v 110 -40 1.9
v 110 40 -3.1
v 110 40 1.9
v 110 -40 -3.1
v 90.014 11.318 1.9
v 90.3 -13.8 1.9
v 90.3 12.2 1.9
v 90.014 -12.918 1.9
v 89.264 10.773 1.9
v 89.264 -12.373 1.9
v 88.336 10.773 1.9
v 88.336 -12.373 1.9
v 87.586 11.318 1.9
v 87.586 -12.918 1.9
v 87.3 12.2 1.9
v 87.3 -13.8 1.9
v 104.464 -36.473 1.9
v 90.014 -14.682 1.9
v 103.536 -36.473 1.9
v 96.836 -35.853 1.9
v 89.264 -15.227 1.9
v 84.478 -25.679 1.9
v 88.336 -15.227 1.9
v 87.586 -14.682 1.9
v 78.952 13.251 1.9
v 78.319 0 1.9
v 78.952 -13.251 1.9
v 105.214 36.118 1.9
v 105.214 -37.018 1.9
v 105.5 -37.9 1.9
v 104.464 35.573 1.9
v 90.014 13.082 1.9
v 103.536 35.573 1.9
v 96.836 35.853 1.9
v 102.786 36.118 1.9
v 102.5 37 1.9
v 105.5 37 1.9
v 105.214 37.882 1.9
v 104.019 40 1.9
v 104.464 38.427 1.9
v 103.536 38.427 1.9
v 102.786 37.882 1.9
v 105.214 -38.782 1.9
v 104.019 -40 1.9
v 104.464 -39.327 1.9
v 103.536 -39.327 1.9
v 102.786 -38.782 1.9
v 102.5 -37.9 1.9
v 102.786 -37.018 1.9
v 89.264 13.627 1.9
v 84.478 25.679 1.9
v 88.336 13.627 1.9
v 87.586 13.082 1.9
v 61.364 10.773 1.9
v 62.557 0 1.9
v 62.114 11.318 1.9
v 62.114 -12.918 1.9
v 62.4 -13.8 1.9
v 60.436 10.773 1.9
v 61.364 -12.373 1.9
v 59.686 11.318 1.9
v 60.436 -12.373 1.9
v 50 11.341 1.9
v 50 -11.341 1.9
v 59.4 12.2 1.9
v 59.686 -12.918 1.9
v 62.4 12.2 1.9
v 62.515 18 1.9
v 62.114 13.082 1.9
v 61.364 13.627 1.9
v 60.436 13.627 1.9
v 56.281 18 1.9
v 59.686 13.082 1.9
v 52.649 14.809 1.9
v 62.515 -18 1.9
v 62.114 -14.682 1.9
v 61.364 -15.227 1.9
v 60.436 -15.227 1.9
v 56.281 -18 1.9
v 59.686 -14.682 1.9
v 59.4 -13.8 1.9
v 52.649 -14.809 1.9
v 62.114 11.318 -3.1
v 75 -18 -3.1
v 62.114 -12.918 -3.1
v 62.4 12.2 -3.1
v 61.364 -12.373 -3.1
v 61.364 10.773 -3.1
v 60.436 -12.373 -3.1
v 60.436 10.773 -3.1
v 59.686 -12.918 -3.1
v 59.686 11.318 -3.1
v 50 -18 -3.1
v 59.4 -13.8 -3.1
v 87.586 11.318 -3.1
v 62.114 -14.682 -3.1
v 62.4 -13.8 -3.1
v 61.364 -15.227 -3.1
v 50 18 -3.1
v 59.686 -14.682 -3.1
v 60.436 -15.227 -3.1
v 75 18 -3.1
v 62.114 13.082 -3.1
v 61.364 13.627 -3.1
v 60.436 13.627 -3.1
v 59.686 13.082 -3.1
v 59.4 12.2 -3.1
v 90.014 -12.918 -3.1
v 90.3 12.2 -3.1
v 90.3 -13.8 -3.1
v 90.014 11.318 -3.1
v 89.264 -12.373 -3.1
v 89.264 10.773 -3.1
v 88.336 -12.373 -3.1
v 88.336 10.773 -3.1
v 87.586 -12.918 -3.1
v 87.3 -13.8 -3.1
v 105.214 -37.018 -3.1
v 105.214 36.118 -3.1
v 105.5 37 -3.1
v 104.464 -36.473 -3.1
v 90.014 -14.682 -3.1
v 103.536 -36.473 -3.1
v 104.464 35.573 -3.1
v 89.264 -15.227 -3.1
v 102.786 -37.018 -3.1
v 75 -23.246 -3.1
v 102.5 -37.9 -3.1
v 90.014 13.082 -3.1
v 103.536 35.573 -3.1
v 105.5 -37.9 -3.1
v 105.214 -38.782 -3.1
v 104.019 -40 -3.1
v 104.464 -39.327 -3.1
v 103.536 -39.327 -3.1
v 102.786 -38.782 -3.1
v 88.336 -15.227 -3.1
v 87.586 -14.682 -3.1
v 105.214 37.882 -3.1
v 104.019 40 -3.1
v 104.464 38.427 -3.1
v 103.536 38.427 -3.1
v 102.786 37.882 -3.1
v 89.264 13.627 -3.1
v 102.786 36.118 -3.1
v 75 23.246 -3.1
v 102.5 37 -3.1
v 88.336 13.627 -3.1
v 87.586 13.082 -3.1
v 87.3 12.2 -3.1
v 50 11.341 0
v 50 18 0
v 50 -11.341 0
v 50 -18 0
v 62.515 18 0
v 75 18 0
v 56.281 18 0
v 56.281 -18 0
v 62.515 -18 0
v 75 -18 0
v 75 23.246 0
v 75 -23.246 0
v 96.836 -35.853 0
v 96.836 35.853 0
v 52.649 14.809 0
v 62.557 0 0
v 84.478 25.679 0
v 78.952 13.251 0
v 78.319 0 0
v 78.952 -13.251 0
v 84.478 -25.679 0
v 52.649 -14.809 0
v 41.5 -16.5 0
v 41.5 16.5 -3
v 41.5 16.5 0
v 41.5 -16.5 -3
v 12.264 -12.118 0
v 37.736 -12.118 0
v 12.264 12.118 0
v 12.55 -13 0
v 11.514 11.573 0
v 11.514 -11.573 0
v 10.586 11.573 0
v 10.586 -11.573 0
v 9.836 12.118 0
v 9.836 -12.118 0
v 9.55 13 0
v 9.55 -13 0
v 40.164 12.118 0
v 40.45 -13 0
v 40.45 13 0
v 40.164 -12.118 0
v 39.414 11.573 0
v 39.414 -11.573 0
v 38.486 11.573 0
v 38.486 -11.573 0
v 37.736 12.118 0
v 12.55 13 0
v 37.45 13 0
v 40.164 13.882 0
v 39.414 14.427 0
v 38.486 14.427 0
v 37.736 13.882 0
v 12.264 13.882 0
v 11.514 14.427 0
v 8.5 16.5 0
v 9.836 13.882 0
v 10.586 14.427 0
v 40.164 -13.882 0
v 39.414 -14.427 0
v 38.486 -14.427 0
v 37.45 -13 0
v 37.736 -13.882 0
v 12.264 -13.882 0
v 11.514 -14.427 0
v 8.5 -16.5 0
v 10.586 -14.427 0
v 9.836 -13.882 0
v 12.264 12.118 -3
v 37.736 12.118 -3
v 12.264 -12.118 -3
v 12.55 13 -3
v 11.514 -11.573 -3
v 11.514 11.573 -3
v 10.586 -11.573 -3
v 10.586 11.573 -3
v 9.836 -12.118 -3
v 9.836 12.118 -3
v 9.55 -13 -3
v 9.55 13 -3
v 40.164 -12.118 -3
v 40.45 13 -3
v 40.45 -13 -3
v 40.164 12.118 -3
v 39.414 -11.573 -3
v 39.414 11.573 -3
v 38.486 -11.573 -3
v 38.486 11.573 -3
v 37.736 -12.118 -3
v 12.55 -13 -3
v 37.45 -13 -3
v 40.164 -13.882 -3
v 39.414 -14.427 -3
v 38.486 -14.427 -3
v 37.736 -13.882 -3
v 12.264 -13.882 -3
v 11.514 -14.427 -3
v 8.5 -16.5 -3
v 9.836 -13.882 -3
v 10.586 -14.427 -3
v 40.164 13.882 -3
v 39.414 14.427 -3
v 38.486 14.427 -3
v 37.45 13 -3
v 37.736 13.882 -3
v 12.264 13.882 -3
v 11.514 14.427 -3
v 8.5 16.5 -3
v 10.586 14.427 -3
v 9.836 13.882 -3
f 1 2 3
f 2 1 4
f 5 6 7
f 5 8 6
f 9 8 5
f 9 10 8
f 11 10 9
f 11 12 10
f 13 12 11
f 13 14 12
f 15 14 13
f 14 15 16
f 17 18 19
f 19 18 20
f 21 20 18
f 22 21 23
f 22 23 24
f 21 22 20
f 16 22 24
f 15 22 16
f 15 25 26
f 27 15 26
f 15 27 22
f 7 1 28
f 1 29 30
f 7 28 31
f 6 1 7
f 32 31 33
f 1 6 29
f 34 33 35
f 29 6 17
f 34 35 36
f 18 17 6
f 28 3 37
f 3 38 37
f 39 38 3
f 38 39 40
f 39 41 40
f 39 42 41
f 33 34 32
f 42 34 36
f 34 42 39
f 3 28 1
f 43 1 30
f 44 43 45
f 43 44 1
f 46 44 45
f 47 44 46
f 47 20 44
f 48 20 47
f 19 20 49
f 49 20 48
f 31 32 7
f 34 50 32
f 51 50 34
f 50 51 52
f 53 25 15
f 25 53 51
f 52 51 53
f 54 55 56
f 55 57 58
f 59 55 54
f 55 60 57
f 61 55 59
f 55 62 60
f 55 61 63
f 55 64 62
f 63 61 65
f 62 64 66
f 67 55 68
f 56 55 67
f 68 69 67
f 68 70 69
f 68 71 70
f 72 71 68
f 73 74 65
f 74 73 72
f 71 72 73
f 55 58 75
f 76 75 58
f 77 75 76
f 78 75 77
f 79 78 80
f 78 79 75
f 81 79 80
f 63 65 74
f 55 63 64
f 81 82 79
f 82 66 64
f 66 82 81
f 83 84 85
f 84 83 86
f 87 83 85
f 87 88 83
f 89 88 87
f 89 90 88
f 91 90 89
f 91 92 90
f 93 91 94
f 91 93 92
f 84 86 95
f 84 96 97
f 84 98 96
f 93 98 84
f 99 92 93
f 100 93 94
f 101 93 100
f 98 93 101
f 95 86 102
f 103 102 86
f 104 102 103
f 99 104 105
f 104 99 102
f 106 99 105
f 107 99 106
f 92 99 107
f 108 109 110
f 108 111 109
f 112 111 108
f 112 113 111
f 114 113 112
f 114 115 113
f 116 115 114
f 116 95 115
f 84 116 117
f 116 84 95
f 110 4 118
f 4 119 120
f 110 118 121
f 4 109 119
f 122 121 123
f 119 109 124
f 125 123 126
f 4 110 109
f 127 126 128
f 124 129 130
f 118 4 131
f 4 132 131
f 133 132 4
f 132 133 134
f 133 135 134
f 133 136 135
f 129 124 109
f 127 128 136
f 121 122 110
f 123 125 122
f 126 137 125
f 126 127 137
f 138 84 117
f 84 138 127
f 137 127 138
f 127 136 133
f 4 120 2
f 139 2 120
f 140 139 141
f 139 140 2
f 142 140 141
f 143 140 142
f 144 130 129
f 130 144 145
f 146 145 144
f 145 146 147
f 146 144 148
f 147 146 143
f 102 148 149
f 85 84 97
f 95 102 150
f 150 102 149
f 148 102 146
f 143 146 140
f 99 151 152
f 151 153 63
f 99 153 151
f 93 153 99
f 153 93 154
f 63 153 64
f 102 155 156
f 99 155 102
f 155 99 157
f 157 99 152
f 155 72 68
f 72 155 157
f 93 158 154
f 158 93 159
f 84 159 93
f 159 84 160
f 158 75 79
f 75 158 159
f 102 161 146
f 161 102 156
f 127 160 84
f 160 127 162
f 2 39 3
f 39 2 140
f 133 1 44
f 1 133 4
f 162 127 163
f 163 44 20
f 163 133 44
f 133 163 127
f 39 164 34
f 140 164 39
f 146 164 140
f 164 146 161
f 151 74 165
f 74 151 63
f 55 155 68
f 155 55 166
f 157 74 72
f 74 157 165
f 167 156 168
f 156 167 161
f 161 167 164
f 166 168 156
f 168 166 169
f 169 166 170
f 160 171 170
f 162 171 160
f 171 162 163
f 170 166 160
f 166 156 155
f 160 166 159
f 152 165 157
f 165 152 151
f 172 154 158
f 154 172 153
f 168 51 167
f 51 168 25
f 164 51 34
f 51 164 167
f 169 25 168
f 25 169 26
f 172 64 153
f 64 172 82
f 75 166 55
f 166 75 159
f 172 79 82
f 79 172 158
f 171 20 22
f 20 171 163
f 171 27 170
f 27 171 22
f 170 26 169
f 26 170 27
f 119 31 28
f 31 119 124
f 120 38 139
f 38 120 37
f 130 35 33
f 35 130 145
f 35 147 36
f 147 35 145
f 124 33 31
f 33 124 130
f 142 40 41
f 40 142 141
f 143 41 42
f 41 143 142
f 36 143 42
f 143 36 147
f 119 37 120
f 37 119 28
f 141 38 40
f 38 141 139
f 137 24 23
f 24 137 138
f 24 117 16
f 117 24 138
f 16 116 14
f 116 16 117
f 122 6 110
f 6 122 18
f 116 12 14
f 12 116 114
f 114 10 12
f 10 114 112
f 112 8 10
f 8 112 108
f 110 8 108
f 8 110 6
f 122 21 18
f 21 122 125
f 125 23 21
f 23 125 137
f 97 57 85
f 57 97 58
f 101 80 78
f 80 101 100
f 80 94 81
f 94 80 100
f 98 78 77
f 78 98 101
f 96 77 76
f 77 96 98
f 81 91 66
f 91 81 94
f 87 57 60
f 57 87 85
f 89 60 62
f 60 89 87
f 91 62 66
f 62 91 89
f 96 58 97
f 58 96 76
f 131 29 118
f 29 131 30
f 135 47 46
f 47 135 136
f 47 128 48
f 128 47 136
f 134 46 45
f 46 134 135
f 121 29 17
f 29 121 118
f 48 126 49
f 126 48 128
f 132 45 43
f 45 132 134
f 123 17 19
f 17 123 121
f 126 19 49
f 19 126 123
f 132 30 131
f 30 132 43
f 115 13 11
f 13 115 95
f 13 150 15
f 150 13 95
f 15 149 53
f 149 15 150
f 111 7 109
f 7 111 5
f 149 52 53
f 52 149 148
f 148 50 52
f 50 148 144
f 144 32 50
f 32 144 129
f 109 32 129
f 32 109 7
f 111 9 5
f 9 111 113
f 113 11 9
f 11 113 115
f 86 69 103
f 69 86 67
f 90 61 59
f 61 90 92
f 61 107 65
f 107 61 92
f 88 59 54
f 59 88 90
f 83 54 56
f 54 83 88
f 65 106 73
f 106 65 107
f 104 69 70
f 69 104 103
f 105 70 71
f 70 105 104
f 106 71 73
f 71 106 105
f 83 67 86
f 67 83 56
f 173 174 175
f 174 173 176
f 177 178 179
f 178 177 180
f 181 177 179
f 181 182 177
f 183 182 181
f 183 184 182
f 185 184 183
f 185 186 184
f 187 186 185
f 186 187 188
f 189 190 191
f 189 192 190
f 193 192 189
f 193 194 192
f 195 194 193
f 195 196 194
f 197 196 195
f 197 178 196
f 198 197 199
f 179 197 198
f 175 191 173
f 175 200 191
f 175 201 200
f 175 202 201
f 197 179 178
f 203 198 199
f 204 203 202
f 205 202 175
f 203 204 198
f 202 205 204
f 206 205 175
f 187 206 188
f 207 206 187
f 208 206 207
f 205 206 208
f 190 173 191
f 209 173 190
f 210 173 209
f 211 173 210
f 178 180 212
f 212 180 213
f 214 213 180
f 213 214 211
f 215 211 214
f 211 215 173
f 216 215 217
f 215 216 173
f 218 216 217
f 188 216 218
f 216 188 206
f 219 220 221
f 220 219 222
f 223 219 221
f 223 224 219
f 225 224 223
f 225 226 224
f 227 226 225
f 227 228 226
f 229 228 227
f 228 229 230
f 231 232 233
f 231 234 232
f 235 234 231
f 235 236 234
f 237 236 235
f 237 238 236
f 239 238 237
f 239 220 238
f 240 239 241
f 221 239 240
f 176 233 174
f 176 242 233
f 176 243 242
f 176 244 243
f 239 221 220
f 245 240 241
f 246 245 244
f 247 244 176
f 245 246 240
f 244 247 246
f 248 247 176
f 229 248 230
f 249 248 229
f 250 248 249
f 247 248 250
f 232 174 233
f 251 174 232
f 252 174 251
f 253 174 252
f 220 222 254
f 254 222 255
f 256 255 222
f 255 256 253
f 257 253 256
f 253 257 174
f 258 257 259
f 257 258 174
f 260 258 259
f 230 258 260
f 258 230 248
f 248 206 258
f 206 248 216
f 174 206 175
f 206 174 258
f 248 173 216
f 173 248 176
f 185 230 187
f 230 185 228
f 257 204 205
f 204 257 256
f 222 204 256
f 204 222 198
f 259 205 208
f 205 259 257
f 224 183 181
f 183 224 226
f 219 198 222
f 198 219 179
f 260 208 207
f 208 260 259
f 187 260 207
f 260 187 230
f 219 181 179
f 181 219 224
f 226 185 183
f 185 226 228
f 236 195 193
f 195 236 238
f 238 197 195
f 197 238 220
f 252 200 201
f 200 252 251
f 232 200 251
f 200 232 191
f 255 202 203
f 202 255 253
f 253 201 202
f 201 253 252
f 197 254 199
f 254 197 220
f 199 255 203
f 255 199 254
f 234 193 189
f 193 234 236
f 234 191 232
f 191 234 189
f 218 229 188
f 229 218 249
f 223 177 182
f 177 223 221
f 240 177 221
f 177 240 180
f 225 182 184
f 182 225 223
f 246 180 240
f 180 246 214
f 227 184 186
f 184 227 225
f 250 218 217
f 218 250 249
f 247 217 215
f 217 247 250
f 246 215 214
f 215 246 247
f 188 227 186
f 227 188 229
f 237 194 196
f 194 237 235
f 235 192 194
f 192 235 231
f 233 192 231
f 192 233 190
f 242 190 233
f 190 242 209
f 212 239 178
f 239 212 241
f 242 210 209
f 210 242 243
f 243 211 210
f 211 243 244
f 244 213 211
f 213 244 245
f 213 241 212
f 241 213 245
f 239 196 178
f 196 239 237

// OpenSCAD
include <lib/flamewheel.scad>;


module arduino(){
    translate([0,0,0])
        cylinder(d=3,20,$fn=10);//Topleft
    translate([15.2,50.8,0])
        cylinder(d=3,20,$fn=10);//Middle top
    translate([15.2 + 27.9,50.8,0]) 
        cylinder(d=3,20,$fn=10);//Middle bottom
    translate([0,50.8 + 24.1,0])    
        cylinder(d=3,20,$fn=10);//Topright
    
    //Bottomleft
//BottomRight
    
    
    
    translate([15.2,24.8,0])
        cylinder(d=3,20,$fn=10);
    translate([15.2 + 27.9,24.8,0]) 
        cylinder(d=3,20,$fn=10);   
}

module arduinoCap(){
    difference(){
    translate([0,0,-3/2])
        cube([33,33,3],center=true);
    translate([-27.9/2,26/2,-10])
        cylinder(d=3,20,$fn=10);
    translate([27.9/2,26/2,-10]) 
        cylinder(d=3,20,$fn=10);
    translate([-27.9/2,-26/2,-10])
        cylinder(d=3,20,$fn=10);
    translate([27.9/2,-26/2,-10]) 
        cylinder(d=3,20,$fn=10);  
    }
}


difference(){
union(){
color([255,0,0])
translate([50,-18,-3.1])
cube([60,36,5]);

color([255,0,0])
translate([75,-40,-3.1])
cube([35,80,5]);


}
union(){
translate([80,-55,0])
rotate([0,0,60])
cube([50,50,30],center=true);
mirror([0,1,0])
translate([80,-55,0])
rotate([0,0,60])
cube([50,50,30],center=true);
}

rotate([0,0,180/6])
dji_f550_hubTop_seg();
rotate([0,0,-180/6])
dji_f550_hubTop_seg();


translate([104,37,-10])rotate([0,0,-180])arduino();
}

translate([25,0,0])
arduinoCap();
